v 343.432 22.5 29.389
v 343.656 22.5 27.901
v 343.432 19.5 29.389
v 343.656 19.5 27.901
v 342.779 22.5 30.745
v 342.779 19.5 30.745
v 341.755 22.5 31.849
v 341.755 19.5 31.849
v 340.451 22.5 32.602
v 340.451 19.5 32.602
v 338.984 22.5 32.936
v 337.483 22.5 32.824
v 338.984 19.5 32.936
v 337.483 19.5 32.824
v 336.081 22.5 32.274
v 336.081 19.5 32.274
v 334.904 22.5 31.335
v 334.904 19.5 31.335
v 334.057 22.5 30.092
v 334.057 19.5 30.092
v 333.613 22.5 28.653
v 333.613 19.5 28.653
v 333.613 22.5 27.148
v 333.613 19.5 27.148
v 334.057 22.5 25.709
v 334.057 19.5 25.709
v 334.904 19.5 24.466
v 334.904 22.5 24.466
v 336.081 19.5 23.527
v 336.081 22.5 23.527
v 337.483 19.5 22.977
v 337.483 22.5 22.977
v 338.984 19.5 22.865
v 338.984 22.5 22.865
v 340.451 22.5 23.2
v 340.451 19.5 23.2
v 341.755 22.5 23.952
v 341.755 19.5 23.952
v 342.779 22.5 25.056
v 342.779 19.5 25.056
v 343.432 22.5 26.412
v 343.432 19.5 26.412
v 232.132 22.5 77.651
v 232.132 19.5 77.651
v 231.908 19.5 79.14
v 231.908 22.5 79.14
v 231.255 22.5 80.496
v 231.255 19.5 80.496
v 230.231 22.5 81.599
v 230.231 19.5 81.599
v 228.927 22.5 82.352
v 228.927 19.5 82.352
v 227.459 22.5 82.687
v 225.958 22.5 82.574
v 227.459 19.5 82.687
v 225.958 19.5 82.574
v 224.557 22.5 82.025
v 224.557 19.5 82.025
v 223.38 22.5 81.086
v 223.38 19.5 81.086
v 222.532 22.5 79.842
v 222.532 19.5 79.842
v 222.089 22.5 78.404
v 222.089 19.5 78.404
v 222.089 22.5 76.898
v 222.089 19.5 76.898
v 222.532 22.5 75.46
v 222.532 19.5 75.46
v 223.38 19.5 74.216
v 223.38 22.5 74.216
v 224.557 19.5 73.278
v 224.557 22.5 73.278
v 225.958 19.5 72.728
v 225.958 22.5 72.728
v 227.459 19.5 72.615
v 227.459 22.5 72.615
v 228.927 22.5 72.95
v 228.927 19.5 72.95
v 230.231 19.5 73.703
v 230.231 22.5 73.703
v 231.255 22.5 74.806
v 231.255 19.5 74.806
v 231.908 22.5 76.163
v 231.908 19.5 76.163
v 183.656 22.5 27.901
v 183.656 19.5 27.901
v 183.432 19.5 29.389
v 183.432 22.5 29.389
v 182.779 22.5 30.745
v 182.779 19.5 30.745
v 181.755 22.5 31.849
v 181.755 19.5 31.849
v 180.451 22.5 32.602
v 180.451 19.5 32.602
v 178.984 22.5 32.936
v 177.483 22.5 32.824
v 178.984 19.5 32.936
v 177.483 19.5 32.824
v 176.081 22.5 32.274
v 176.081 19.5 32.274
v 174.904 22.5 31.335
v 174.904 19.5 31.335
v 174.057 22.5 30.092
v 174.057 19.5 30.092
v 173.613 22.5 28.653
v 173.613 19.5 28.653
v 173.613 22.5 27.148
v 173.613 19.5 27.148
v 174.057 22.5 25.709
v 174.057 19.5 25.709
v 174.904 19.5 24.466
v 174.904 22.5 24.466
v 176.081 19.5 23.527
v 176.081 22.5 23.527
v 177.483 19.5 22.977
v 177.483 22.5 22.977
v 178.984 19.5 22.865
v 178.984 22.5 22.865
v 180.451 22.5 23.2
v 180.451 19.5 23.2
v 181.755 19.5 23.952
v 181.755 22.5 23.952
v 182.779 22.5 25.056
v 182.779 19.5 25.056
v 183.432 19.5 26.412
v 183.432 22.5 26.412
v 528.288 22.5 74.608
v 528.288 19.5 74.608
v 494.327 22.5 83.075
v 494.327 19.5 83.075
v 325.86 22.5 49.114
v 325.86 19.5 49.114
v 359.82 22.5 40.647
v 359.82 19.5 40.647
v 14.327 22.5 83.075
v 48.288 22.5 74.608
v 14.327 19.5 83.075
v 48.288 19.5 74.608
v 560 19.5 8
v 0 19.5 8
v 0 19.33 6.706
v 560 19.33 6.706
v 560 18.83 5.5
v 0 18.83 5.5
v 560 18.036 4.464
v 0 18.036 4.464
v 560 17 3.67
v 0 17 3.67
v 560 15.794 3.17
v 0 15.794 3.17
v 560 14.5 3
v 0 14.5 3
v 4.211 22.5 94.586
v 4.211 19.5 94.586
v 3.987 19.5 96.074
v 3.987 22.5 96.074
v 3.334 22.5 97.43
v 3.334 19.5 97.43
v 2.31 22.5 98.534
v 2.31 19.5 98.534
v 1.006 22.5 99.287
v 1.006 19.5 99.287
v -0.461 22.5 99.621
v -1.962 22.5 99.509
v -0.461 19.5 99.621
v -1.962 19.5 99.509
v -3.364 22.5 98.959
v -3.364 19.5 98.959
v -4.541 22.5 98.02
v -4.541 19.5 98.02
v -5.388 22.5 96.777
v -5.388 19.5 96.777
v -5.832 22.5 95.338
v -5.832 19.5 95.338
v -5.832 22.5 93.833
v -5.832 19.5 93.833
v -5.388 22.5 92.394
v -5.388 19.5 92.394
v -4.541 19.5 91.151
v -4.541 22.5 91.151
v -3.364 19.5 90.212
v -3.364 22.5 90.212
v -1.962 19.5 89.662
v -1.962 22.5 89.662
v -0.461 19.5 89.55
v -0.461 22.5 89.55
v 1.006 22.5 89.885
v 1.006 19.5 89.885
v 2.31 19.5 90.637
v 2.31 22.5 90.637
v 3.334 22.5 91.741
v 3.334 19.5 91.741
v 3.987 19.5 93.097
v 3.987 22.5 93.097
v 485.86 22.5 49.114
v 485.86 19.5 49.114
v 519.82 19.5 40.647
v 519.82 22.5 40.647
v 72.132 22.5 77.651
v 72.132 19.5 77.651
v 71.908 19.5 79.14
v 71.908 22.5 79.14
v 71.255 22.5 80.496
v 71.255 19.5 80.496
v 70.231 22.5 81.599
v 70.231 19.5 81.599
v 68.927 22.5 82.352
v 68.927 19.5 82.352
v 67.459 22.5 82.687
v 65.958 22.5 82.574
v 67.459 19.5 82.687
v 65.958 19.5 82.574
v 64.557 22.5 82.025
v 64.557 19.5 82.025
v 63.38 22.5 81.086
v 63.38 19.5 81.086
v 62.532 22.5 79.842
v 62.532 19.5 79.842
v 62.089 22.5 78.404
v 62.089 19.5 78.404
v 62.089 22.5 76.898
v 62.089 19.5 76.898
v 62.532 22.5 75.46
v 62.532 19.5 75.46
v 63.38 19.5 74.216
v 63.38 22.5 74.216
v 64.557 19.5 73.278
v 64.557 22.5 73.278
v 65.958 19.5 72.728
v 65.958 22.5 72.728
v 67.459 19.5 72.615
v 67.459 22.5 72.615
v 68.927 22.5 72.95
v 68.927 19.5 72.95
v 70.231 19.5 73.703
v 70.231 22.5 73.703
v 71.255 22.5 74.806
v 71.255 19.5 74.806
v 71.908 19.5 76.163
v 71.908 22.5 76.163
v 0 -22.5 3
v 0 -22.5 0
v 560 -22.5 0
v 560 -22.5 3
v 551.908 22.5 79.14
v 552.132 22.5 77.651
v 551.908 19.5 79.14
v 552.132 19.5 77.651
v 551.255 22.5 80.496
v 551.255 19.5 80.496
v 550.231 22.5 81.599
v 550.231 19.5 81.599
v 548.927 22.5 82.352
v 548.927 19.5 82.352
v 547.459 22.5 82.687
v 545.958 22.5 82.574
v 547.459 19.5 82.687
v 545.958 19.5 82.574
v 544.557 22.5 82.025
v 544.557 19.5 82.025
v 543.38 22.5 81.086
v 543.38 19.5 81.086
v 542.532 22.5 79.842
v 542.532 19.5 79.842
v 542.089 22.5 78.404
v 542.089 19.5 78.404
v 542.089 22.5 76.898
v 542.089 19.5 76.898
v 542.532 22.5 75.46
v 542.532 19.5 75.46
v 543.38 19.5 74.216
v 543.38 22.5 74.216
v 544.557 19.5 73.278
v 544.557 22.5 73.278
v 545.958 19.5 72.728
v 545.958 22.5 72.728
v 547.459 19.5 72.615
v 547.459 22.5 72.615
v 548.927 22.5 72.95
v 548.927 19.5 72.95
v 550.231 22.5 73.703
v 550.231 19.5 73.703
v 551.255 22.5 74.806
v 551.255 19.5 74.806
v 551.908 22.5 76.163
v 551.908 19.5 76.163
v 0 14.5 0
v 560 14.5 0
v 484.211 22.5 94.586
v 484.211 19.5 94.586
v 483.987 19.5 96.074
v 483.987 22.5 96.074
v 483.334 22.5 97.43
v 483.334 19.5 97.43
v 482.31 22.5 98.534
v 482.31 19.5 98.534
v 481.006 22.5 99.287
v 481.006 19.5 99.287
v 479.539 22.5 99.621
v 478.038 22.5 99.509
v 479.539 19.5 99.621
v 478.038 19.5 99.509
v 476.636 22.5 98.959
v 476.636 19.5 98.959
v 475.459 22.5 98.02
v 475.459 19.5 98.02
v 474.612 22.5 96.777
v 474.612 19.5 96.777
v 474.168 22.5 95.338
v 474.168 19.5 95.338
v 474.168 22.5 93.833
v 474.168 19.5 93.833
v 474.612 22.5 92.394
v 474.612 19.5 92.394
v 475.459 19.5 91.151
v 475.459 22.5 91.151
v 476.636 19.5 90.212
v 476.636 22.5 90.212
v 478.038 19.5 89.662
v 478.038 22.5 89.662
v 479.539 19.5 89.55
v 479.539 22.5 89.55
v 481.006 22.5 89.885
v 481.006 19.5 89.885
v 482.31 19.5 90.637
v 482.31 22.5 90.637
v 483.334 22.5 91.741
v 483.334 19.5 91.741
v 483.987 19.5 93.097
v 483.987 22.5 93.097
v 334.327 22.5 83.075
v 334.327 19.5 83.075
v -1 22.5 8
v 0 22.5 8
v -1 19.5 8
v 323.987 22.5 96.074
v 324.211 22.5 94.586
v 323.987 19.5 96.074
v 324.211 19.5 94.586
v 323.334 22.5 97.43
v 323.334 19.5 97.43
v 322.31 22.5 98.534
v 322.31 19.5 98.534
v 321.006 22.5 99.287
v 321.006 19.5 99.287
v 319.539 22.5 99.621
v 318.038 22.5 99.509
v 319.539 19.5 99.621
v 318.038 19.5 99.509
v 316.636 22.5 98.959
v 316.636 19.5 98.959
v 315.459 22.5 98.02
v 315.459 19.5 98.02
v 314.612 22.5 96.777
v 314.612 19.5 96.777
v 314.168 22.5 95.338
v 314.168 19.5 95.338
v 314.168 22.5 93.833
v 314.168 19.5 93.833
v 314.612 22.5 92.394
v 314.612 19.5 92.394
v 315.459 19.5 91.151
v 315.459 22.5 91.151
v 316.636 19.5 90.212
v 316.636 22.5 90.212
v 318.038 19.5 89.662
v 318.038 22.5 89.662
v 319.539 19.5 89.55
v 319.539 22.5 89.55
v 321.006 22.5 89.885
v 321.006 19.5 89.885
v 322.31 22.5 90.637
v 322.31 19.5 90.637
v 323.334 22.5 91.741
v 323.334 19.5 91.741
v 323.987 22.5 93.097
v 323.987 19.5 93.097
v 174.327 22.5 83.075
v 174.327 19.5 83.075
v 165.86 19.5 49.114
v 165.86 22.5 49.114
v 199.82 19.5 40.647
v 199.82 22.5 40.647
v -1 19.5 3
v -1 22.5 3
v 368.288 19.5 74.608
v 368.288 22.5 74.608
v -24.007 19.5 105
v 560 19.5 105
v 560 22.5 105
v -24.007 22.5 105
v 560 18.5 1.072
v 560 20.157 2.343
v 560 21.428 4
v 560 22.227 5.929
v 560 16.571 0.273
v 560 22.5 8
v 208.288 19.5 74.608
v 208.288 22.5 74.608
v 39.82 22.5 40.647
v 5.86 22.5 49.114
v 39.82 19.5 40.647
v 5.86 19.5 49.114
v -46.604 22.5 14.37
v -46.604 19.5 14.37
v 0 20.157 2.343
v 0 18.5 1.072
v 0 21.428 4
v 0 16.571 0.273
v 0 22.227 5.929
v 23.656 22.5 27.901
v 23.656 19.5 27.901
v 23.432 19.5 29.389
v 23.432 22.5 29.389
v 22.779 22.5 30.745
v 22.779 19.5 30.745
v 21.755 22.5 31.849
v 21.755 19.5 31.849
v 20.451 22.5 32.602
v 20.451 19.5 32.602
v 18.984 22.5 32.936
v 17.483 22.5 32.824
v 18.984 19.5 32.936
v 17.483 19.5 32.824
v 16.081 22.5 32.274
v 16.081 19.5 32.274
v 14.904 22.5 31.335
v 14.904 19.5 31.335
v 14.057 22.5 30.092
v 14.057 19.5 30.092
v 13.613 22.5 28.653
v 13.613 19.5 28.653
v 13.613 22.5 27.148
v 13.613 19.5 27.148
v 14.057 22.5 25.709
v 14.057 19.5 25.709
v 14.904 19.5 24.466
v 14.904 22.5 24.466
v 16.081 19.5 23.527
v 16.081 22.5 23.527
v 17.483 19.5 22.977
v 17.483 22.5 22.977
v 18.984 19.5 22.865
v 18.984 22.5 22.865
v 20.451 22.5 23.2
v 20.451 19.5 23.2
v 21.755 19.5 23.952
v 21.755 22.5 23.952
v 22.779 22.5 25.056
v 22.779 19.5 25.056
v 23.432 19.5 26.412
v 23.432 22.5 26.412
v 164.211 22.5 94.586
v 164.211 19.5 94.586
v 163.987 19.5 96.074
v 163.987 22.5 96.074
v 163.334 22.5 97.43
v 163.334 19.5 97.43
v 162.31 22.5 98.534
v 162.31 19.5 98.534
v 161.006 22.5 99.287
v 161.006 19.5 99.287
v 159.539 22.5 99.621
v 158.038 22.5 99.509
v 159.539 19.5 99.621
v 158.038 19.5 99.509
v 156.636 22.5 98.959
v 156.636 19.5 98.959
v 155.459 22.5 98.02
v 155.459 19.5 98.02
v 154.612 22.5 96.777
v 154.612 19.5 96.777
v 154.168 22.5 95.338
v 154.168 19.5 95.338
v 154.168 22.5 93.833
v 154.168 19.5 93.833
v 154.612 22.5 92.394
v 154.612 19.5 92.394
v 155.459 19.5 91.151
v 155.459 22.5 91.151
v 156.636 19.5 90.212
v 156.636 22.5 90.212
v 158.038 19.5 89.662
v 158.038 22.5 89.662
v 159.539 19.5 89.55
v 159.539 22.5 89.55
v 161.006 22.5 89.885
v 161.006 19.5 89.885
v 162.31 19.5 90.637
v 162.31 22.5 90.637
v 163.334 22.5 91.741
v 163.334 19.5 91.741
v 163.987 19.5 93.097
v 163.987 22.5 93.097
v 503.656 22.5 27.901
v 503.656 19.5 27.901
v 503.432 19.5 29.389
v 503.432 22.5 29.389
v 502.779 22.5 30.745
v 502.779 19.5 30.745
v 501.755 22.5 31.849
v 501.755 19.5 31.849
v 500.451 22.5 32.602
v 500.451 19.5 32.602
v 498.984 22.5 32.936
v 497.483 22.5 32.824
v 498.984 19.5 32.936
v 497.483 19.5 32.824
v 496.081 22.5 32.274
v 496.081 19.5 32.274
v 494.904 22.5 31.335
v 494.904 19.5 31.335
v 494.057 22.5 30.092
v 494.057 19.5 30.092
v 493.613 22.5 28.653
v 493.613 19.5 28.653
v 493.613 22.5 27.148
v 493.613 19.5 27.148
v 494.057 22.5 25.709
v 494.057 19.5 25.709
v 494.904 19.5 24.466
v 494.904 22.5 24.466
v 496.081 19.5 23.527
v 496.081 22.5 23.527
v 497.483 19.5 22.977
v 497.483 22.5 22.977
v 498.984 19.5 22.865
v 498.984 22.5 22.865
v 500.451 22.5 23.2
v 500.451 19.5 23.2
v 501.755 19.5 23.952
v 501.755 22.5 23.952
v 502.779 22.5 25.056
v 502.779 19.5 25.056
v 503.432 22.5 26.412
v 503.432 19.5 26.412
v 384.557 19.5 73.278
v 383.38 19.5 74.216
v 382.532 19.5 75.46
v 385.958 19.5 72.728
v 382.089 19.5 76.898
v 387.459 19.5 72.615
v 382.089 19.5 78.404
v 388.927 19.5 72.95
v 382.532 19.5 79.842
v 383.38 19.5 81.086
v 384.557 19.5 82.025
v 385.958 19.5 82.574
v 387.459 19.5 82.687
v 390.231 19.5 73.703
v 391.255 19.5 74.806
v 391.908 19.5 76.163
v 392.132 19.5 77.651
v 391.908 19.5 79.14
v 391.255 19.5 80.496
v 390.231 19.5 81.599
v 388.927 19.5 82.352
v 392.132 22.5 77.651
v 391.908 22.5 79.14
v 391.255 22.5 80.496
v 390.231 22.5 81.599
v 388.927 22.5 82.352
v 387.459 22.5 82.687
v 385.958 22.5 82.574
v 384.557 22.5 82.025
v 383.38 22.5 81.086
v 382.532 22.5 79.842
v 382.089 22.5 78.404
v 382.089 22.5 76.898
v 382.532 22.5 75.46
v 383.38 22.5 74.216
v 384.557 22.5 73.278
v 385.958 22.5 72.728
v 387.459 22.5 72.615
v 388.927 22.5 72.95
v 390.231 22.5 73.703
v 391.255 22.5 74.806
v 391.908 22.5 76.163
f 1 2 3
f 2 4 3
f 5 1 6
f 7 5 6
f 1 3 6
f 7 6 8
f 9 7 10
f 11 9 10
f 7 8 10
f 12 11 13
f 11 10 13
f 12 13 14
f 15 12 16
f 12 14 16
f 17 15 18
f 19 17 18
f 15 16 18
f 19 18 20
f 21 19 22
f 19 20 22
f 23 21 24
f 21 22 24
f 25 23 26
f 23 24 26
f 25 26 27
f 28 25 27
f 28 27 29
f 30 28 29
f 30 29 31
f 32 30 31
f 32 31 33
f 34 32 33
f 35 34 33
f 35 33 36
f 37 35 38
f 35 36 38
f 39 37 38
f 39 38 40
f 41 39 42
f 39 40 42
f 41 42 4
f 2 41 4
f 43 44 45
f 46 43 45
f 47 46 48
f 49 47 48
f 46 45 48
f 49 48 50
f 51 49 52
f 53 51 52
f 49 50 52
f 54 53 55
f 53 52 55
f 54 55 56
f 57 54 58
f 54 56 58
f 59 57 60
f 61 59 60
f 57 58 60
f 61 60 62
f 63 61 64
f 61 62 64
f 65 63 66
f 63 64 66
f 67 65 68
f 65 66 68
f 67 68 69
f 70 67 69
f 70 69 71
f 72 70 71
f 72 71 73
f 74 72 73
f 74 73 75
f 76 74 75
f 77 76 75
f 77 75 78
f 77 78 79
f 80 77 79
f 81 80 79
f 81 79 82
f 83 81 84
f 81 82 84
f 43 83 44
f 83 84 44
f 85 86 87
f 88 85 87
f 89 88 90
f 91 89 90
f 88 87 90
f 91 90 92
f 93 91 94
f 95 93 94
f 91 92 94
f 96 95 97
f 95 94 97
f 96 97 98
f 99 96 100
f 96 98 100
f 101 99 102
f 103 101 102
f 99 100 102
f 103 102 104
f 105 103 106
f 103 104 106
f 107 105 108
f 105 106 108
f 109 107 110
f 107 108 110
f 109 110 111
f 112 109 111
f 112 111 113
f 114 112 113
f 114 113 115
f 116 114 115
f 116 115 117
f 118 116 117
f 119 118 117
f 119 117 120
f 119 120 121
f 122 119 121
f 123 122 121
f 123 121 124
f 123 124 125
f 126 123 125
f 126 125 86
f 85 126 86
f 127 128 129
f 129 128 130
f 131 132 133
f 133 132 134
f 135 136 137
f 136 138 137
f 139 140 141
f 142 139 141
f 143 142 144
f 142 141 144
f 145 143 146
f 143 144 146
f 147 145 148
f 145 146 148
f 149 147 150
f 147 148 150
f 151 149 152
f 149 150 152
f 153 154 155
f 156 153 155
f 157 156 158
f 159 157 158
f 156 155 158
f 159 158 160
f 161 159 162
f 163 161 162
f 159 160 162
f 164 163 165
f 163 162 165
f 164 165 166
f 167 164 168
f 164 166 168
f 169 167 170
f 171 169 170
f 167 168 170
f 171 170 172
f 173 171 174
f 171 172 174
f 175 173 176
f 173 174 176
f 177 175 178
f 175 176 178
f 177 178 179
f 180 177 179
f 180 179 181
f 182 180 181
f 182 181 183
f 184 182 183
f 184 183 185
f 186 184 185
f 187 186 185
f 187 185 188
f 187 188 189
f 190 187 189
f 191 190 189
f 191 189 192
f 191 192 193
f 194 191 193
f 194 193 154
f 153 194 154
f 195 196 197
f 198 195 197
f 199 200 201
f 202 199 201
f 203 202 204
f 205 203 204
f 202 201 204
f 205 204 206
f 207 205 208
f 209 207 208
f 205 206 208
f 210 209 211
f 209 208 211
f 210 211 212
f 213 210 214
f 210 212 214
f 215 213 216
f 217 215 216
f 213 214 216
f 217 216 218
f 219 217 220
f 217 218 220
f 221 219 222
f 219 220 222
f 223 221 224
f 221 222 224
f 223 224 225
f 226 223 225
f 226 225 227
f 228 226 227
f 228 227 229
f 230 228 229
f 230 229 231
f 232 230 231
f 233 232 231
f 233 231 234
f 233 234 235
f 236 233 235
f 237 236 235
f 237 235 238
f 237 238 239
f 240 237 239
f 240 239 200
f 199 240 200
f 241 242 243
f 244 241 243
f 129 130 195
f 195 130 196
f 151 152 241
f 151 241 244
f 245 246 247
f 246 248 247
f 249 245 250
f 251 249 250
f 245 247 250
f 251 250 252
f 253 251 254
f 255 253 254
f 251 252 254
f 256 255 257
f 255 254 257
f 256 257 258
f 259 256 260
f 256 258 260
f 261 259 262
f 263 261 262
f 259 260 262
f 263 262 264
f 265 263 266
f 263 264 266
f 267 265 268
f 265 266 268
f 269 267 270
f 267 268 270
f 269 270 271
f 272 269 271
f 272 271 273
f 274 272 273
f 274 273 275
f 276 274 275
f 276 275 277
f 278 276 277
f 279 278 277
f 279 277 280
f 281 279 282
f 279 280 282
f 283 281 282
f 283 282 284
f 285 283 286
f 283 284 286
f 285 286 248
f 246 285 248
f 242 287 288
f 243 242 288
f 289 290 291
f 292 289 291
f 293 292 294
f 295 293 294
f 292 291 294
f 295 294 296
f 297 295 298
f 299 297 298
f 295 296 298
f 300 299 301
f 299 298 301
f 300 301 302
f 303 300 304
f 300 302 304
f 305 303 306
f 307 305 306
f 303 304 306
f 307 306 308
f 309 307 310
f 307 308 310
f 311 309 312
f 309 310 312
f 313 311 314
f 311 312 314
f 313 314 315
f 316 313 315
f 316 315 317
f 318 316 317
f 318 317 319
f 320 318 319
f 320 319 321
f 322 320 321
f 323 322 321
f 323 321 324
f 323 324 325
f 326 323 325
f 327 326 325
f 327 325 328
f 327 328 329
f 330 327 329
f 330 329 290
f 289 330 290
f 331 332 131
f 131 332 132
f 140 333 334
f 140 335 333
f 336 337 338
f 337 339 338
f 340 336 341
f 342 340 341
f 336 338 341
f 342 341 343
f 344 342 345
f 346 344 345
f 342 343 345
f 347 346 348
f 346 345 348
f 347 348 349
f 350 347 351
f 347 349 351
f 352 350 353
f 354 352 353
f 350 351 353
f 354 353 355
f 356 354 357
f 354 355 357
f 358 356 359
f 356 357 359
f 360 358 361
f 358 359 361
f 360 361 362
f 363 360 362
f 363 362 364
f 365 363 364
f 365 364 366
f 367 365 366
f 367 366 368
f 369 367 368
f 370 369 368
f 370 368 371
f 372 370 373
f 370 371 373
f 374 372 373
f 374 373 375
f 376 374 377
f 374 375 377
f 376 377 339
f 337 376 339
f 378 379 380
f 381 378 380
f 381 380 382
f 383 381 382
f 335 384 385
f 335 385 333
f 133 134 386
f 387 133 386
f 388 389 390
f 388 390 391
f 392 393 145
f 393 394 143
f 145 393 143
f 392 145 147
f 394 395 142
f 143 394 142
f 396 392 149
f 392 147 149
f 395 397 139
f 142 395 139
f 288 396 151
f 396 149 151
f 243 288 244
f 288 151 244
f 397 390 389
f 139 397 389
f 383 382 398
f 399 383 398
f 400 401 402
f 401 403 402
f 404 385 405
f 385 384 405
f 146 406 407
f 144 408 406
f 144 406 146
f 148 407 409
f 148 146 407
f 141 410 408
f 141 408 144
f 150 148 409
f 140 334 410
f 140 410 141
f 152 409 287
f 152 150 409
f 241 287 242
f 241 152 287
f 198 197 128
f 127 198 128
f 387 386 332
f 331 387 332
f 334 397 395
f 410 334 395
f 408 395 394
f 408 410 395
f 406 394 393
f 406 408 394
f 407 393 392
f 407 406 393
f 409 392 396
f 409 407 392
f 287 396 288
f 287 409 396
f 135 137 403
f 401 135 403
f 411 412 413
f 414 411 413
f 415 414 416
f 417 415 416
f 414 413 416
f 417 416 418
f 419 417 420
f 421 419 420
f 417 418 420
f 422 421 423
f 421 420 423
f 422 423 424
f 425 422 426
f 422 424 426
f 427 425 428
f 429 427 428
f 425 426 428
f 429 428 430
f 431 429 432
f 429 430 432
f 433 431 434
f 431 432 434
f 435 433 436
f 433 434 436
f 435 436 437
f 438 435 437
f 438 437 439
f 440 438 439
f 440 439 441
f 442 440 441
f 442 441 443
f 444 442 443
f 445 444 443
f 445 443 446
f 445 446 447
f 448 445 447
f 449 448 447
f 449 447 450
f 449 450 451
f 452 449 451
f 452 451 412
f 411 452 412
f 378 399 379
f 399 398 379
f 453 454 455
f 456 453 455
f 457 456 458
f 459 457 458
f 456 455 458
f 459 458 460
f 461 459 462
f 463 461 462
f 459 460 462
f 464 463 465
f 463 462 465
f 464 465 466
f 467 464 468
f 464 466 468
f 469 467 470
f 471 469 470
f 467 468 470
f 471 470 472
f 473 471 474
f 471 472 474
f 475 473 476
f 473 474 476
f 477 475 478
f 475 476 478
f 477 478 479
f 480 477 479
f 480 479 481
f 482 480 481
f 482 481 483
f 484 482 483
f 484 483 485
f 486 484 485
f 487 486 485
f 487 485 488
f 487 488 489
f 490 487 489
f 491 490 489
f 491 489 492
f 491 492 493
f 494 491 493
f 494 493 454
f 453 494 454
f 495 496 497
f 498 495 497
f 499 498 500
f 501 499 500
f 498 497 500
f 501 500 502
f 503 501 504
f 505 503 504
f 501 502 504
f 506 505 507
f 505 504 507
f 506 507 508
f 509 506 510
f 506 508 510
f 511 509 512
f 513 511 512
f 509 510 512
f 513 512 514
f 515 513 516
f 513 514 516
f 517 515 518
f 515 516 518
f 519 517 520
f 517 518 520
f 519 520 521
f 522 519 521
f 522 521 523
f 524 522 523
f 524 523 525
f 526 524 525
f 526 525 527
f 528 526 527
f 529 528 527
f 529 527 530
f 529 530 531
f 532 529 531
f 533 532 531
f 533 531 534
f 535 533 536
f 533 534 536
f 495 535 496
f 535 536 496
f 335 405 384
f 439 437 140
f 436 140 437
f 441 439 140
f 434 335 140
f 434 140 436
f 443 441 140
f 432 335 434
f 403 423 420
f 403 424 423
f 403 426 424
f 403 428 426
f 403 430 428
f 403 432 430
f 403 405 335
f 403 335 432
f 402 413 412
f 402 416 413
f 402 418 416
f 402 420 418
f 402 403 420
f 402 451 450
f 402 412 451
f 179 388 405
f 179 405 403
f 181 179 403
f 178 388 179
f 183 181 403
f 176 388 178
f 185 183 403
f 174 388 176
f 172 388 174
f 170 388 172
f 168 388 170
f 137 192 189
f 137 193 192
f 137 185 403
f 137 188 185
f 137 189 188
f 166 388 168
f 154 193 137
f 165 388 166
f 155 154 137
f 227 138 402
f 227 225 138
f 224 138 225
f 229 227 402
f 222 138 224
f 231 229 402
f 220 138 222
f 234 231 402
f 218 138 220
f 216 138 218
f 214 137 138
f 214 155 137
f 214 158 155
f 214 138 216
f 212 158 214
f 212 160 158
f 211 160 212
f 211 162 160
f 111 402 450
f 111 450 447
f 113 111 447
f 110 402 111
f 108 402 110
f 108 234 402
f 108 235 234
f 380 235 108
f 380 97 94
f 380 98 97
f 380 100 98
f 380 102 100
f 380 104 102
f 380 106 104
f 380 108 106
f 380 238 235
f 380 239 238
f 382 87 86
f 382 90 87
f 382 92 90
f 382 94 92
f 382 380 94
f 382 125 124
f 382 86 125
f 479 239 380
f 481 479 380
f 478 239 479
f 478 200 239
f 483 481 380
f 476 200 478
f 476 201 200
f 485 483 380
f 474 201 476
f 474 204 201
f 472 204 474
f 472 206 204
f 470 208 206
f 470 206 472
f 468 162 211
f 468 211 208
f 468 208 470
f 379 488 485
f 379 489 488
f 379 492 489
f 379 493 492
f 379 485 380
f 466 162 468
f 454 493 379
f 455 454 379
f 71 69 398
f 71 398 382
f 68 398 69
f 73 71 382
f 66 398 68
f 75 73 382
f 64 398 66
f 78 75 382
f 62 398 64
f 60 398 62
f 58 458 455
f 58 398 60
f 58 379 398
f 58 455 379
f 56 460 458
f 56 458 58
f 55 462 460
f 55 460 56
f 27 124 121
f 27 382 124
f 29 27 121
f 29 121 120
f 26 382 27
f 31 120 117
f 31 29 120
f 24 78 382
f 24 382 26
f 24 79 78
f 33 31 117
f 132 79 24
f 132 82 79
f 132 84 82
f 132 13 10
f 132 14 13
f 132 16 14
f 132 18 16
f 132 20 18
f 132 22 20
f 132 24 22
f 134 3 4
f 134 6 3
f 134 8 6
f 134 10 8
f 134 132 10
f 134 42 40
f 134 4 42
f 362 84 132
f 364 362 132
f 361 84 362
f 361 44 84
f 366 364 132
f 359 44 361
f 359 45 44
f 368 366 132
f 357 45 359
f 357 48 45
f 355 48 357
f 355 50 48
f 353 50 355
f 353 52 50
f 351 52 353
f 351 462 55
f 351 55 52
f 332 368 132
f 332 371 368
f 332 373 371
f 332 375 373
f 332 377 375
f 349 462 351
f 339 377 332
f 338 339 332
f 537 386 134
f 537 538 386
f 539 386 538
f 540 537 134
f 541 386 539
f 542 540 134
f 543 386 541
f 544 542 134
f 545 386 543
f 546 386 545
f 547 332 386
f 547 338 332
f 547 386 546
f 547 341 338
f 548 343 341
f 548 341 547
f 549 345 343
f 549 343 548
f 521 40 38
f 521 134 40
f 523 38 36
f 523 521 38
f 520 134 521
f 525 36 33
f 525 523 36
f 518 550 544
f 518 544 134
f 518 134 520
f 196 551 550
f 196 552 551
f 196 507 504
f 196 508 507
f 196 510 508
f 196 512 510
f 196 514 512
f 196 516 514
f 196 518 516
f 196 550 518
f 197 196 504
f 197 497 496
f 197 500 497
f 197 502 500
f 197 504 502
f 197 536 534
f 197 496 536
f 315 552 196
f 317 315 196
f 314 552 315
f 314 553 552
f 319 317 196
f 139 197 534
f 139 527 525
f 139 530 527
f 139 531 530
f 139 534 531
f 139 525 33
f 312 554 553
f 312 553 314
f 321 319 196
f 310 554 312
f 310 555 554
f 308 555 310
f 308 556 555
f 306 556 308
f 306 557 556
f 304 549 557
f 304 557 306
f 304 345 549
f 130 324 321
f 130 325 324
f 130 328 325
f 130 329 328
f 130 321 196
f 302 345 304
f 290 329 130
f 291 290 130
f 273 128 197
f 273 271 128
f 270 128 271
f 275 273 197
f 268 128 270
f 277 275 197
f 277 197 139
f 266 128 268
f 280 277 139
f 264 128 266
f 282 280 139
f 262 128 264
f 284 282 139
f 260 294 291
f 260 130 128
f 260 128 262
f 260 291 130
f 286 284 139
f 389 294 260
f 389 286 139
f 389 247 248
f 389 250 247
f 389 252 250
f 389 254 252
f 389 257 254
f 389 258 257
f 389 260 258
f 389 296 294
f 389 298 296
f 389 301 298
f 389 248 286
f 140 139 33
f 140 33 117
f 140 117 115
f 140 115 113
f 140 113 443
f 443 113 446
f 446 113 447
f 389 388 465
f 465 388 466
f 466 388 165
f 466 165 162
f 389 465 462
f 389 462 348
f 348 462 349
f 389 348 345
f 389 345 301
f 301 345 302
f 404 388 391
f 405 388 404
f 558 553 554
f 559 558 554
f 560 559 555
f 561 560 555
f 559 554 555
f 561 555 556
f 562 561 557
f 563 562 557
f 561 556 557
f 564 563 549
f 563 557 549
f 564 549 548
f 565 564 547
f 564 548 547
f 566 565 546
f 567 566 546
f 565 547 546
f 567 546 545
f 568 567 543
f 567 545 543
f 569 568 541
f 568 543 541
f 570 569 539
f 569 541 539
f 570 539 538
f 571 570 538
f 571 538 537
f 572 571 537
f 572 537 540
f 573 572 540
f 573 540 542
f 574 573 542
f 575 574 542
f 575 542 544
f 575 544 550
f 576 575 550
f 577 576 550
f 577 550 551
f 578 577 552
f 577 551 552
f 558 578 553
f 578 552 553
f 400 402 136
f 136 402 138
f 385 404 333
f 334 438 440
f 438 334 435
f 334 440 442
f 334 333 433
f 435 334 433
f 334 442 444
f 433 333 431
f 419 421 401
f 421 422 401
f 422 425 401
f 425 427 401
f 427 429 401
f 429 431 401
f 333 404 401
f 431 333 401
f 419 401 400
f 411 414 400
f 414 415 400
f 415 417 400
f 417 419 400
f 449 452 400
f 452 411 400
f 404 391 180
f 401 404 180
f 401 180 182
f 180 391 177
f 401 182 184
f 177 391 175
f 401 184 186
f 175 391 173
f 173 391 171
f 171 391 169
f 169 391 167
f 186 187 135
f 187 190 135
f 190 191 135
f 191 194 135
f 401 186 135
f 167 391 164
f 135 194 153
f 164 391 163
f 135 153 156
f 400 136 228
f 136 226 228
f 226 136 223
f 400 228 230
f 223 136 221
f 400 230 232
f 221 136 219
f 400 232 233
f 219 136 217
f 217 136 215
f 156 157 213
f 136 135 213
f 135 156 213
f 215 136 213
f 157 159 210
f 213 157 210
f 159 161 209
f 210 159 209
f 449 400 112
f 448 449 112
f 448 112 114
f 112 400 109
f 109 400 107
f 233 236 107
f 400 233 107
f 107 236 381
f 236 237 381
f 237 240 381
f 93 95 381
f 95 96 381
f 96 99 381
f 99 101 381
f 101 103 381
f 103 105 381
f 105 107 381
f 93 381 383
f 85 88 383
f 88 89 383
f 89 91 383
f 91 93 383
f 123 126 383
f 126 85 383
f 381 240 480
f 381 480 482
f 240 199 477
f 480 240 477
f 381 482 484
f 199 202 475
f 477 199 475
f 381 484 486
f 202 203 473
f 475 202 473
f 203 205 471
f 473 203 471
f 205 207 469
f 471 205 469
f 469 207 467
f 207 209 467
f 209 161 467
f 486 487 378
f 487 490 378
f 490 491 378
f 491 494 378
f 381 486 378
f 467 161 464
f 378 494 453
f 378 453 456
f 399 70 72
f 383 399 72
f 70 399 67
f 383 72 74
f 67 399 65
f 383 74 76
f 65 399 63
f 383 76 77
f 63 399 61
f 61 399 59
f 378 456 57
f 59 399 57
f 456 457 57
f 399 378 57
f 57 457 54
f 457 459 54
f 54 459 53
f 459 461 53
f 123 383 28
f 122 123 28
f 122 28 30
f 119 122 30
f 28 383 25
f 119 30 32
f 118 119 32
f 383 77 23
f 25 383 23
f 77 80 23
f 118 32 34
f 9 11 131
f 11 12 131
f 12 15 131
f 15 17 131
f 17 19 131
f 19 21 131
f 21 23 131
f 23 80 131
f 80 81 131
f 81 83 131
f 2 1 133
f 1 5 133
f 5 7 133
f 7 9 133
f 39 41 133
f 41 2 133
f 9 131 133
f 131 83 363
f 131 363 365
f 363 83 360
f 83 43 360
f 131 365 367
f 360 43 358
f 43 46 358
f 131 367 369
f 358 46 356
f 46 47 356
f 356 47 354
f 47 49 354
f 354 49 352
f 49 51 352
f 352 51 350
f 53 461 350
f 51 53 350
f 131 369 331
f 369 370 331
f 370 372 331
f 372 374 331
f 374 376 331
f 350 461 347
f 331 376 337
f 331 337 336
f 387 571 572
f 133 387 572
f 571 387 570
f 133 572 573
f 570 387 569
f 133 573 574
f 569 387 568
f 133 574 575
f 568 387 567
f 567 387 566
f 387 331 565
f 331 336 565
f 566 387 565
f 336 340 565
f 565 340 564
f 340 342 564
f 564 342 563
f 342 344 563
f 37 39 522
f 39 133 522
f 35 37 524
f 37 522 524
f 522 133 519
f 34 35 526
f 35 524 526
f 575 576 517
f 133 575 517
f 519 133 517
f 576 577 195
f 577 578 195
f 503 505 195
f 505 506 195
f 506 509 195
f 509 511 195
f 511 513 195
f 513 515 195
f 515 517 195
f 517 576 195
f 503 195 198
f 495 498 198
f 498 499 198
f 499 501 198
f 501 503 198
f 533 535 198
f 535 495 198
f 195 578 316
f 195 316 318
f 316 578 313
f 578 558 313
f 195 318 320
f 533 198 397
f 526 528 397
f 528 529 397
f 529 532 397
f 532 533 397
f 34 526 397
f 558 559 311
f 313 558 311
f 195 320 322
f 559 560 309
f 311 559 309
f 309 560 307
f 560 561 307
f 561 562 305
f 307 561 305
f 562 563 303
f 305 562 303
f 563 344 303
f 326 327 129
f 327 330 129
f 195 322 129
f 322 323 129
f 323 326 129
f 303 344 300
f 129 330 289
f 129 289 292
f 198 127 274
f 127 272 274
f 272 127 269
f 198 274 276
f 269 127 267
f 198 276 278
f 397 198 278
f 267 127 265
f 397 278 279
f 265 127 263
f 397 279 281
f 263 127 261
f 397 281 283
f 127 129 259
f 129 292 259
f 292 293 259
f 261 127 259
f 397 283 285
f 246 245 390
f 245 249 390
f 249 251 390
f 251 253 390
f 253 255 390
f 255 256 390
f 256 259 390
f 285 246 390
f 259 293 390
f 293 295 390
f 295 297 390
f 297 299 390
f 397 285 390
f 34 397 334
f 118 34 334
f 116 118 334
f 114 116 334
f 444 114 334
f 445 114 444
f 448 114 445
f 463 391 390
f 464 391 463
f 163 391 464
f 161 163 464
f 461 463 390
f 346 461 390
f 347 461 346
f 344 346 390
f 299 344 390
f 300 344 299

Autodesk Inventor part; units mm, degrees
ref_plane "YZ Plane" through (0, 0, 0) normal (1, 0, 0) x (0, 1, 0)
ref_plane "XZ Plane" through (0, 0, 0) normal (0, 1, 0) x (-1, 0, 0)
ref_plane "XY Plane" through (0, 0, 0) normal (0, 0, 1) x (1, 0, 0)
sketch "Sketch1" plane through (0, 0, 0) normal (0, 0, 1) x (1, 0, 0)
  line L0 (0, -22.5) -> (560, -22.5)
  line L1 (560, -22.5) -> (560, 22.5)
  line L2 (560, 22.5) -> (0, 22.5)
  line L3 (0, 22.5) -> (0, -22.5)
  line L4 (0, -22.5) -> (560, 22.5) construction
  line L5 (560, -22.5) -> (0, 22.5) construction
  point P0 (0, 0)
  point P1 (0, 0)
  dimension "d154" = 560
  dimension "d155" = 45
extrude "Plate3" add sketch "Sketch1" along normal blind 3
sketch "Sketch7" plane through (0, 19.5, 0) normal (0, 1, 0) x (-1, 0, 0)
  line L0 (-560, 0) -> (0, 0)
  line L1 (0, 0) -> (0, 105)
  line L2 (0, 105) -> (-560, 105)
  line L3 (-560, 105) -> (-560, 0)
edge flange "Flange3" height 105 angle 90 thickness 3 bend radius 5 thickness toward (0, 1, 0) relief round relief width 3 relief depth 1.5 edges at (280, 22.5, 3) wall of the first edge with corners at (560, 19.5, 0) (0, 19.5, 0) (0, 19.5, 105) (560, 19.5, 105)
bend "Bend3"
corner "Corner3"
sketch "Sketch11" plane through (0, 19.5, 105) normal (0, -1, 0) x (1, 0, 0)
  line L0 (0, -97) -> (560, -97) projected
  line L1 (560, -97) -> (560, 0) projected
  line L2 (560, 0) -> (0, 0) projected
  line L3 (0, -97) -> (0, 0) projected
  line L4 (0, 0) -> (-24.0074, 0)
  line L5 (-24.0074, 0) -> (-49.4388, -102)
  line L6 (-49.4388, -102) -> (-1, -102)
  line L7 (-1, -102) -> (-1, -97)
  line L8 (-1, -97) -> (0, -97)
  line L9 (560, -102) -> (0, -102) projected
  line L10 (-1, -102) -> (-46.6039, -90.6297)
  point P0 (0, -105)
  dimension "d193" = 1
  dimension "d194" = 24.0074
  dimension "d195" = 14
  dimension "d203" = 47
extrude "Extrusion6" add sketch "Sketch11" against normal up to surface (3 mm away) contours L8 L7 L10 L5 L4 L3
sketch "Sketch12" plane through (560, 19.5, 8) normal (0, -1, 0) x (1, 0, 0)
  line L0 (-511.7125, 66.6075) -> (-545.6729, 75.0748)
  line L1 (-545.6729, 75.0748) -> (-554.1401, 41.1144)
  line L2 (-554.1401, 41.1144) -> (-520.1798, 32.6472)
  line L3 (-520.1798, 32.6472) -> (-511.7125, 66.6075)
  line L4 (-511.7125, 66.6075) -> (-554.1401, 41.1144) construction
  line L5 (-545.6729, 75.0748) -> (-520.1798, 32.6472) construction
  circle A0 centre (-541.3936, 19.9006) radius 5.05
  circle A1 centre (-492.9179, 69.6511) radius 5.05
  circle A2 centre (-560.8386, 86.5856) radius 5.05
  line L6 (-492.9179, 69.6511) -> (-560.8386, 86.5856) construction
  line L7 (-560.8386, 86.5856) -> (-541.3936, 19.9006) construction
  line L8 (-541.3936, 19.9006) -> (-492.9179, 69.6511) construction
  line L9 (-528.6927, 70.8411) -> (-541.3936, 19.9006) construction
  line L10 (-584.0074, 97) -> (-606.6039, 6.3703) projected
  point P0 (-560, -8)
  point P1 (-532.9263, 53.861)
  point P2 (-544.0023, 9.4376)
  dimension "d206" = 35
  dimension "d207" = 35
  dimension "d208" = 10.1
  dimension "d209" = 70
  dimension "d210" = 60
  dimension "d211" = 25
  dimension "d213" = 12
  dimension "d214" = 60
extrude "Cut1" cut sketch "Sketch12" against normal blind 3
pattern_linear "Rectangular Pattern5" count 4 spacing 160 along (1, 0, 0) of "Cut1"
properties part number "DS-B-102 ridge bottom" material "Stainless Steel"
